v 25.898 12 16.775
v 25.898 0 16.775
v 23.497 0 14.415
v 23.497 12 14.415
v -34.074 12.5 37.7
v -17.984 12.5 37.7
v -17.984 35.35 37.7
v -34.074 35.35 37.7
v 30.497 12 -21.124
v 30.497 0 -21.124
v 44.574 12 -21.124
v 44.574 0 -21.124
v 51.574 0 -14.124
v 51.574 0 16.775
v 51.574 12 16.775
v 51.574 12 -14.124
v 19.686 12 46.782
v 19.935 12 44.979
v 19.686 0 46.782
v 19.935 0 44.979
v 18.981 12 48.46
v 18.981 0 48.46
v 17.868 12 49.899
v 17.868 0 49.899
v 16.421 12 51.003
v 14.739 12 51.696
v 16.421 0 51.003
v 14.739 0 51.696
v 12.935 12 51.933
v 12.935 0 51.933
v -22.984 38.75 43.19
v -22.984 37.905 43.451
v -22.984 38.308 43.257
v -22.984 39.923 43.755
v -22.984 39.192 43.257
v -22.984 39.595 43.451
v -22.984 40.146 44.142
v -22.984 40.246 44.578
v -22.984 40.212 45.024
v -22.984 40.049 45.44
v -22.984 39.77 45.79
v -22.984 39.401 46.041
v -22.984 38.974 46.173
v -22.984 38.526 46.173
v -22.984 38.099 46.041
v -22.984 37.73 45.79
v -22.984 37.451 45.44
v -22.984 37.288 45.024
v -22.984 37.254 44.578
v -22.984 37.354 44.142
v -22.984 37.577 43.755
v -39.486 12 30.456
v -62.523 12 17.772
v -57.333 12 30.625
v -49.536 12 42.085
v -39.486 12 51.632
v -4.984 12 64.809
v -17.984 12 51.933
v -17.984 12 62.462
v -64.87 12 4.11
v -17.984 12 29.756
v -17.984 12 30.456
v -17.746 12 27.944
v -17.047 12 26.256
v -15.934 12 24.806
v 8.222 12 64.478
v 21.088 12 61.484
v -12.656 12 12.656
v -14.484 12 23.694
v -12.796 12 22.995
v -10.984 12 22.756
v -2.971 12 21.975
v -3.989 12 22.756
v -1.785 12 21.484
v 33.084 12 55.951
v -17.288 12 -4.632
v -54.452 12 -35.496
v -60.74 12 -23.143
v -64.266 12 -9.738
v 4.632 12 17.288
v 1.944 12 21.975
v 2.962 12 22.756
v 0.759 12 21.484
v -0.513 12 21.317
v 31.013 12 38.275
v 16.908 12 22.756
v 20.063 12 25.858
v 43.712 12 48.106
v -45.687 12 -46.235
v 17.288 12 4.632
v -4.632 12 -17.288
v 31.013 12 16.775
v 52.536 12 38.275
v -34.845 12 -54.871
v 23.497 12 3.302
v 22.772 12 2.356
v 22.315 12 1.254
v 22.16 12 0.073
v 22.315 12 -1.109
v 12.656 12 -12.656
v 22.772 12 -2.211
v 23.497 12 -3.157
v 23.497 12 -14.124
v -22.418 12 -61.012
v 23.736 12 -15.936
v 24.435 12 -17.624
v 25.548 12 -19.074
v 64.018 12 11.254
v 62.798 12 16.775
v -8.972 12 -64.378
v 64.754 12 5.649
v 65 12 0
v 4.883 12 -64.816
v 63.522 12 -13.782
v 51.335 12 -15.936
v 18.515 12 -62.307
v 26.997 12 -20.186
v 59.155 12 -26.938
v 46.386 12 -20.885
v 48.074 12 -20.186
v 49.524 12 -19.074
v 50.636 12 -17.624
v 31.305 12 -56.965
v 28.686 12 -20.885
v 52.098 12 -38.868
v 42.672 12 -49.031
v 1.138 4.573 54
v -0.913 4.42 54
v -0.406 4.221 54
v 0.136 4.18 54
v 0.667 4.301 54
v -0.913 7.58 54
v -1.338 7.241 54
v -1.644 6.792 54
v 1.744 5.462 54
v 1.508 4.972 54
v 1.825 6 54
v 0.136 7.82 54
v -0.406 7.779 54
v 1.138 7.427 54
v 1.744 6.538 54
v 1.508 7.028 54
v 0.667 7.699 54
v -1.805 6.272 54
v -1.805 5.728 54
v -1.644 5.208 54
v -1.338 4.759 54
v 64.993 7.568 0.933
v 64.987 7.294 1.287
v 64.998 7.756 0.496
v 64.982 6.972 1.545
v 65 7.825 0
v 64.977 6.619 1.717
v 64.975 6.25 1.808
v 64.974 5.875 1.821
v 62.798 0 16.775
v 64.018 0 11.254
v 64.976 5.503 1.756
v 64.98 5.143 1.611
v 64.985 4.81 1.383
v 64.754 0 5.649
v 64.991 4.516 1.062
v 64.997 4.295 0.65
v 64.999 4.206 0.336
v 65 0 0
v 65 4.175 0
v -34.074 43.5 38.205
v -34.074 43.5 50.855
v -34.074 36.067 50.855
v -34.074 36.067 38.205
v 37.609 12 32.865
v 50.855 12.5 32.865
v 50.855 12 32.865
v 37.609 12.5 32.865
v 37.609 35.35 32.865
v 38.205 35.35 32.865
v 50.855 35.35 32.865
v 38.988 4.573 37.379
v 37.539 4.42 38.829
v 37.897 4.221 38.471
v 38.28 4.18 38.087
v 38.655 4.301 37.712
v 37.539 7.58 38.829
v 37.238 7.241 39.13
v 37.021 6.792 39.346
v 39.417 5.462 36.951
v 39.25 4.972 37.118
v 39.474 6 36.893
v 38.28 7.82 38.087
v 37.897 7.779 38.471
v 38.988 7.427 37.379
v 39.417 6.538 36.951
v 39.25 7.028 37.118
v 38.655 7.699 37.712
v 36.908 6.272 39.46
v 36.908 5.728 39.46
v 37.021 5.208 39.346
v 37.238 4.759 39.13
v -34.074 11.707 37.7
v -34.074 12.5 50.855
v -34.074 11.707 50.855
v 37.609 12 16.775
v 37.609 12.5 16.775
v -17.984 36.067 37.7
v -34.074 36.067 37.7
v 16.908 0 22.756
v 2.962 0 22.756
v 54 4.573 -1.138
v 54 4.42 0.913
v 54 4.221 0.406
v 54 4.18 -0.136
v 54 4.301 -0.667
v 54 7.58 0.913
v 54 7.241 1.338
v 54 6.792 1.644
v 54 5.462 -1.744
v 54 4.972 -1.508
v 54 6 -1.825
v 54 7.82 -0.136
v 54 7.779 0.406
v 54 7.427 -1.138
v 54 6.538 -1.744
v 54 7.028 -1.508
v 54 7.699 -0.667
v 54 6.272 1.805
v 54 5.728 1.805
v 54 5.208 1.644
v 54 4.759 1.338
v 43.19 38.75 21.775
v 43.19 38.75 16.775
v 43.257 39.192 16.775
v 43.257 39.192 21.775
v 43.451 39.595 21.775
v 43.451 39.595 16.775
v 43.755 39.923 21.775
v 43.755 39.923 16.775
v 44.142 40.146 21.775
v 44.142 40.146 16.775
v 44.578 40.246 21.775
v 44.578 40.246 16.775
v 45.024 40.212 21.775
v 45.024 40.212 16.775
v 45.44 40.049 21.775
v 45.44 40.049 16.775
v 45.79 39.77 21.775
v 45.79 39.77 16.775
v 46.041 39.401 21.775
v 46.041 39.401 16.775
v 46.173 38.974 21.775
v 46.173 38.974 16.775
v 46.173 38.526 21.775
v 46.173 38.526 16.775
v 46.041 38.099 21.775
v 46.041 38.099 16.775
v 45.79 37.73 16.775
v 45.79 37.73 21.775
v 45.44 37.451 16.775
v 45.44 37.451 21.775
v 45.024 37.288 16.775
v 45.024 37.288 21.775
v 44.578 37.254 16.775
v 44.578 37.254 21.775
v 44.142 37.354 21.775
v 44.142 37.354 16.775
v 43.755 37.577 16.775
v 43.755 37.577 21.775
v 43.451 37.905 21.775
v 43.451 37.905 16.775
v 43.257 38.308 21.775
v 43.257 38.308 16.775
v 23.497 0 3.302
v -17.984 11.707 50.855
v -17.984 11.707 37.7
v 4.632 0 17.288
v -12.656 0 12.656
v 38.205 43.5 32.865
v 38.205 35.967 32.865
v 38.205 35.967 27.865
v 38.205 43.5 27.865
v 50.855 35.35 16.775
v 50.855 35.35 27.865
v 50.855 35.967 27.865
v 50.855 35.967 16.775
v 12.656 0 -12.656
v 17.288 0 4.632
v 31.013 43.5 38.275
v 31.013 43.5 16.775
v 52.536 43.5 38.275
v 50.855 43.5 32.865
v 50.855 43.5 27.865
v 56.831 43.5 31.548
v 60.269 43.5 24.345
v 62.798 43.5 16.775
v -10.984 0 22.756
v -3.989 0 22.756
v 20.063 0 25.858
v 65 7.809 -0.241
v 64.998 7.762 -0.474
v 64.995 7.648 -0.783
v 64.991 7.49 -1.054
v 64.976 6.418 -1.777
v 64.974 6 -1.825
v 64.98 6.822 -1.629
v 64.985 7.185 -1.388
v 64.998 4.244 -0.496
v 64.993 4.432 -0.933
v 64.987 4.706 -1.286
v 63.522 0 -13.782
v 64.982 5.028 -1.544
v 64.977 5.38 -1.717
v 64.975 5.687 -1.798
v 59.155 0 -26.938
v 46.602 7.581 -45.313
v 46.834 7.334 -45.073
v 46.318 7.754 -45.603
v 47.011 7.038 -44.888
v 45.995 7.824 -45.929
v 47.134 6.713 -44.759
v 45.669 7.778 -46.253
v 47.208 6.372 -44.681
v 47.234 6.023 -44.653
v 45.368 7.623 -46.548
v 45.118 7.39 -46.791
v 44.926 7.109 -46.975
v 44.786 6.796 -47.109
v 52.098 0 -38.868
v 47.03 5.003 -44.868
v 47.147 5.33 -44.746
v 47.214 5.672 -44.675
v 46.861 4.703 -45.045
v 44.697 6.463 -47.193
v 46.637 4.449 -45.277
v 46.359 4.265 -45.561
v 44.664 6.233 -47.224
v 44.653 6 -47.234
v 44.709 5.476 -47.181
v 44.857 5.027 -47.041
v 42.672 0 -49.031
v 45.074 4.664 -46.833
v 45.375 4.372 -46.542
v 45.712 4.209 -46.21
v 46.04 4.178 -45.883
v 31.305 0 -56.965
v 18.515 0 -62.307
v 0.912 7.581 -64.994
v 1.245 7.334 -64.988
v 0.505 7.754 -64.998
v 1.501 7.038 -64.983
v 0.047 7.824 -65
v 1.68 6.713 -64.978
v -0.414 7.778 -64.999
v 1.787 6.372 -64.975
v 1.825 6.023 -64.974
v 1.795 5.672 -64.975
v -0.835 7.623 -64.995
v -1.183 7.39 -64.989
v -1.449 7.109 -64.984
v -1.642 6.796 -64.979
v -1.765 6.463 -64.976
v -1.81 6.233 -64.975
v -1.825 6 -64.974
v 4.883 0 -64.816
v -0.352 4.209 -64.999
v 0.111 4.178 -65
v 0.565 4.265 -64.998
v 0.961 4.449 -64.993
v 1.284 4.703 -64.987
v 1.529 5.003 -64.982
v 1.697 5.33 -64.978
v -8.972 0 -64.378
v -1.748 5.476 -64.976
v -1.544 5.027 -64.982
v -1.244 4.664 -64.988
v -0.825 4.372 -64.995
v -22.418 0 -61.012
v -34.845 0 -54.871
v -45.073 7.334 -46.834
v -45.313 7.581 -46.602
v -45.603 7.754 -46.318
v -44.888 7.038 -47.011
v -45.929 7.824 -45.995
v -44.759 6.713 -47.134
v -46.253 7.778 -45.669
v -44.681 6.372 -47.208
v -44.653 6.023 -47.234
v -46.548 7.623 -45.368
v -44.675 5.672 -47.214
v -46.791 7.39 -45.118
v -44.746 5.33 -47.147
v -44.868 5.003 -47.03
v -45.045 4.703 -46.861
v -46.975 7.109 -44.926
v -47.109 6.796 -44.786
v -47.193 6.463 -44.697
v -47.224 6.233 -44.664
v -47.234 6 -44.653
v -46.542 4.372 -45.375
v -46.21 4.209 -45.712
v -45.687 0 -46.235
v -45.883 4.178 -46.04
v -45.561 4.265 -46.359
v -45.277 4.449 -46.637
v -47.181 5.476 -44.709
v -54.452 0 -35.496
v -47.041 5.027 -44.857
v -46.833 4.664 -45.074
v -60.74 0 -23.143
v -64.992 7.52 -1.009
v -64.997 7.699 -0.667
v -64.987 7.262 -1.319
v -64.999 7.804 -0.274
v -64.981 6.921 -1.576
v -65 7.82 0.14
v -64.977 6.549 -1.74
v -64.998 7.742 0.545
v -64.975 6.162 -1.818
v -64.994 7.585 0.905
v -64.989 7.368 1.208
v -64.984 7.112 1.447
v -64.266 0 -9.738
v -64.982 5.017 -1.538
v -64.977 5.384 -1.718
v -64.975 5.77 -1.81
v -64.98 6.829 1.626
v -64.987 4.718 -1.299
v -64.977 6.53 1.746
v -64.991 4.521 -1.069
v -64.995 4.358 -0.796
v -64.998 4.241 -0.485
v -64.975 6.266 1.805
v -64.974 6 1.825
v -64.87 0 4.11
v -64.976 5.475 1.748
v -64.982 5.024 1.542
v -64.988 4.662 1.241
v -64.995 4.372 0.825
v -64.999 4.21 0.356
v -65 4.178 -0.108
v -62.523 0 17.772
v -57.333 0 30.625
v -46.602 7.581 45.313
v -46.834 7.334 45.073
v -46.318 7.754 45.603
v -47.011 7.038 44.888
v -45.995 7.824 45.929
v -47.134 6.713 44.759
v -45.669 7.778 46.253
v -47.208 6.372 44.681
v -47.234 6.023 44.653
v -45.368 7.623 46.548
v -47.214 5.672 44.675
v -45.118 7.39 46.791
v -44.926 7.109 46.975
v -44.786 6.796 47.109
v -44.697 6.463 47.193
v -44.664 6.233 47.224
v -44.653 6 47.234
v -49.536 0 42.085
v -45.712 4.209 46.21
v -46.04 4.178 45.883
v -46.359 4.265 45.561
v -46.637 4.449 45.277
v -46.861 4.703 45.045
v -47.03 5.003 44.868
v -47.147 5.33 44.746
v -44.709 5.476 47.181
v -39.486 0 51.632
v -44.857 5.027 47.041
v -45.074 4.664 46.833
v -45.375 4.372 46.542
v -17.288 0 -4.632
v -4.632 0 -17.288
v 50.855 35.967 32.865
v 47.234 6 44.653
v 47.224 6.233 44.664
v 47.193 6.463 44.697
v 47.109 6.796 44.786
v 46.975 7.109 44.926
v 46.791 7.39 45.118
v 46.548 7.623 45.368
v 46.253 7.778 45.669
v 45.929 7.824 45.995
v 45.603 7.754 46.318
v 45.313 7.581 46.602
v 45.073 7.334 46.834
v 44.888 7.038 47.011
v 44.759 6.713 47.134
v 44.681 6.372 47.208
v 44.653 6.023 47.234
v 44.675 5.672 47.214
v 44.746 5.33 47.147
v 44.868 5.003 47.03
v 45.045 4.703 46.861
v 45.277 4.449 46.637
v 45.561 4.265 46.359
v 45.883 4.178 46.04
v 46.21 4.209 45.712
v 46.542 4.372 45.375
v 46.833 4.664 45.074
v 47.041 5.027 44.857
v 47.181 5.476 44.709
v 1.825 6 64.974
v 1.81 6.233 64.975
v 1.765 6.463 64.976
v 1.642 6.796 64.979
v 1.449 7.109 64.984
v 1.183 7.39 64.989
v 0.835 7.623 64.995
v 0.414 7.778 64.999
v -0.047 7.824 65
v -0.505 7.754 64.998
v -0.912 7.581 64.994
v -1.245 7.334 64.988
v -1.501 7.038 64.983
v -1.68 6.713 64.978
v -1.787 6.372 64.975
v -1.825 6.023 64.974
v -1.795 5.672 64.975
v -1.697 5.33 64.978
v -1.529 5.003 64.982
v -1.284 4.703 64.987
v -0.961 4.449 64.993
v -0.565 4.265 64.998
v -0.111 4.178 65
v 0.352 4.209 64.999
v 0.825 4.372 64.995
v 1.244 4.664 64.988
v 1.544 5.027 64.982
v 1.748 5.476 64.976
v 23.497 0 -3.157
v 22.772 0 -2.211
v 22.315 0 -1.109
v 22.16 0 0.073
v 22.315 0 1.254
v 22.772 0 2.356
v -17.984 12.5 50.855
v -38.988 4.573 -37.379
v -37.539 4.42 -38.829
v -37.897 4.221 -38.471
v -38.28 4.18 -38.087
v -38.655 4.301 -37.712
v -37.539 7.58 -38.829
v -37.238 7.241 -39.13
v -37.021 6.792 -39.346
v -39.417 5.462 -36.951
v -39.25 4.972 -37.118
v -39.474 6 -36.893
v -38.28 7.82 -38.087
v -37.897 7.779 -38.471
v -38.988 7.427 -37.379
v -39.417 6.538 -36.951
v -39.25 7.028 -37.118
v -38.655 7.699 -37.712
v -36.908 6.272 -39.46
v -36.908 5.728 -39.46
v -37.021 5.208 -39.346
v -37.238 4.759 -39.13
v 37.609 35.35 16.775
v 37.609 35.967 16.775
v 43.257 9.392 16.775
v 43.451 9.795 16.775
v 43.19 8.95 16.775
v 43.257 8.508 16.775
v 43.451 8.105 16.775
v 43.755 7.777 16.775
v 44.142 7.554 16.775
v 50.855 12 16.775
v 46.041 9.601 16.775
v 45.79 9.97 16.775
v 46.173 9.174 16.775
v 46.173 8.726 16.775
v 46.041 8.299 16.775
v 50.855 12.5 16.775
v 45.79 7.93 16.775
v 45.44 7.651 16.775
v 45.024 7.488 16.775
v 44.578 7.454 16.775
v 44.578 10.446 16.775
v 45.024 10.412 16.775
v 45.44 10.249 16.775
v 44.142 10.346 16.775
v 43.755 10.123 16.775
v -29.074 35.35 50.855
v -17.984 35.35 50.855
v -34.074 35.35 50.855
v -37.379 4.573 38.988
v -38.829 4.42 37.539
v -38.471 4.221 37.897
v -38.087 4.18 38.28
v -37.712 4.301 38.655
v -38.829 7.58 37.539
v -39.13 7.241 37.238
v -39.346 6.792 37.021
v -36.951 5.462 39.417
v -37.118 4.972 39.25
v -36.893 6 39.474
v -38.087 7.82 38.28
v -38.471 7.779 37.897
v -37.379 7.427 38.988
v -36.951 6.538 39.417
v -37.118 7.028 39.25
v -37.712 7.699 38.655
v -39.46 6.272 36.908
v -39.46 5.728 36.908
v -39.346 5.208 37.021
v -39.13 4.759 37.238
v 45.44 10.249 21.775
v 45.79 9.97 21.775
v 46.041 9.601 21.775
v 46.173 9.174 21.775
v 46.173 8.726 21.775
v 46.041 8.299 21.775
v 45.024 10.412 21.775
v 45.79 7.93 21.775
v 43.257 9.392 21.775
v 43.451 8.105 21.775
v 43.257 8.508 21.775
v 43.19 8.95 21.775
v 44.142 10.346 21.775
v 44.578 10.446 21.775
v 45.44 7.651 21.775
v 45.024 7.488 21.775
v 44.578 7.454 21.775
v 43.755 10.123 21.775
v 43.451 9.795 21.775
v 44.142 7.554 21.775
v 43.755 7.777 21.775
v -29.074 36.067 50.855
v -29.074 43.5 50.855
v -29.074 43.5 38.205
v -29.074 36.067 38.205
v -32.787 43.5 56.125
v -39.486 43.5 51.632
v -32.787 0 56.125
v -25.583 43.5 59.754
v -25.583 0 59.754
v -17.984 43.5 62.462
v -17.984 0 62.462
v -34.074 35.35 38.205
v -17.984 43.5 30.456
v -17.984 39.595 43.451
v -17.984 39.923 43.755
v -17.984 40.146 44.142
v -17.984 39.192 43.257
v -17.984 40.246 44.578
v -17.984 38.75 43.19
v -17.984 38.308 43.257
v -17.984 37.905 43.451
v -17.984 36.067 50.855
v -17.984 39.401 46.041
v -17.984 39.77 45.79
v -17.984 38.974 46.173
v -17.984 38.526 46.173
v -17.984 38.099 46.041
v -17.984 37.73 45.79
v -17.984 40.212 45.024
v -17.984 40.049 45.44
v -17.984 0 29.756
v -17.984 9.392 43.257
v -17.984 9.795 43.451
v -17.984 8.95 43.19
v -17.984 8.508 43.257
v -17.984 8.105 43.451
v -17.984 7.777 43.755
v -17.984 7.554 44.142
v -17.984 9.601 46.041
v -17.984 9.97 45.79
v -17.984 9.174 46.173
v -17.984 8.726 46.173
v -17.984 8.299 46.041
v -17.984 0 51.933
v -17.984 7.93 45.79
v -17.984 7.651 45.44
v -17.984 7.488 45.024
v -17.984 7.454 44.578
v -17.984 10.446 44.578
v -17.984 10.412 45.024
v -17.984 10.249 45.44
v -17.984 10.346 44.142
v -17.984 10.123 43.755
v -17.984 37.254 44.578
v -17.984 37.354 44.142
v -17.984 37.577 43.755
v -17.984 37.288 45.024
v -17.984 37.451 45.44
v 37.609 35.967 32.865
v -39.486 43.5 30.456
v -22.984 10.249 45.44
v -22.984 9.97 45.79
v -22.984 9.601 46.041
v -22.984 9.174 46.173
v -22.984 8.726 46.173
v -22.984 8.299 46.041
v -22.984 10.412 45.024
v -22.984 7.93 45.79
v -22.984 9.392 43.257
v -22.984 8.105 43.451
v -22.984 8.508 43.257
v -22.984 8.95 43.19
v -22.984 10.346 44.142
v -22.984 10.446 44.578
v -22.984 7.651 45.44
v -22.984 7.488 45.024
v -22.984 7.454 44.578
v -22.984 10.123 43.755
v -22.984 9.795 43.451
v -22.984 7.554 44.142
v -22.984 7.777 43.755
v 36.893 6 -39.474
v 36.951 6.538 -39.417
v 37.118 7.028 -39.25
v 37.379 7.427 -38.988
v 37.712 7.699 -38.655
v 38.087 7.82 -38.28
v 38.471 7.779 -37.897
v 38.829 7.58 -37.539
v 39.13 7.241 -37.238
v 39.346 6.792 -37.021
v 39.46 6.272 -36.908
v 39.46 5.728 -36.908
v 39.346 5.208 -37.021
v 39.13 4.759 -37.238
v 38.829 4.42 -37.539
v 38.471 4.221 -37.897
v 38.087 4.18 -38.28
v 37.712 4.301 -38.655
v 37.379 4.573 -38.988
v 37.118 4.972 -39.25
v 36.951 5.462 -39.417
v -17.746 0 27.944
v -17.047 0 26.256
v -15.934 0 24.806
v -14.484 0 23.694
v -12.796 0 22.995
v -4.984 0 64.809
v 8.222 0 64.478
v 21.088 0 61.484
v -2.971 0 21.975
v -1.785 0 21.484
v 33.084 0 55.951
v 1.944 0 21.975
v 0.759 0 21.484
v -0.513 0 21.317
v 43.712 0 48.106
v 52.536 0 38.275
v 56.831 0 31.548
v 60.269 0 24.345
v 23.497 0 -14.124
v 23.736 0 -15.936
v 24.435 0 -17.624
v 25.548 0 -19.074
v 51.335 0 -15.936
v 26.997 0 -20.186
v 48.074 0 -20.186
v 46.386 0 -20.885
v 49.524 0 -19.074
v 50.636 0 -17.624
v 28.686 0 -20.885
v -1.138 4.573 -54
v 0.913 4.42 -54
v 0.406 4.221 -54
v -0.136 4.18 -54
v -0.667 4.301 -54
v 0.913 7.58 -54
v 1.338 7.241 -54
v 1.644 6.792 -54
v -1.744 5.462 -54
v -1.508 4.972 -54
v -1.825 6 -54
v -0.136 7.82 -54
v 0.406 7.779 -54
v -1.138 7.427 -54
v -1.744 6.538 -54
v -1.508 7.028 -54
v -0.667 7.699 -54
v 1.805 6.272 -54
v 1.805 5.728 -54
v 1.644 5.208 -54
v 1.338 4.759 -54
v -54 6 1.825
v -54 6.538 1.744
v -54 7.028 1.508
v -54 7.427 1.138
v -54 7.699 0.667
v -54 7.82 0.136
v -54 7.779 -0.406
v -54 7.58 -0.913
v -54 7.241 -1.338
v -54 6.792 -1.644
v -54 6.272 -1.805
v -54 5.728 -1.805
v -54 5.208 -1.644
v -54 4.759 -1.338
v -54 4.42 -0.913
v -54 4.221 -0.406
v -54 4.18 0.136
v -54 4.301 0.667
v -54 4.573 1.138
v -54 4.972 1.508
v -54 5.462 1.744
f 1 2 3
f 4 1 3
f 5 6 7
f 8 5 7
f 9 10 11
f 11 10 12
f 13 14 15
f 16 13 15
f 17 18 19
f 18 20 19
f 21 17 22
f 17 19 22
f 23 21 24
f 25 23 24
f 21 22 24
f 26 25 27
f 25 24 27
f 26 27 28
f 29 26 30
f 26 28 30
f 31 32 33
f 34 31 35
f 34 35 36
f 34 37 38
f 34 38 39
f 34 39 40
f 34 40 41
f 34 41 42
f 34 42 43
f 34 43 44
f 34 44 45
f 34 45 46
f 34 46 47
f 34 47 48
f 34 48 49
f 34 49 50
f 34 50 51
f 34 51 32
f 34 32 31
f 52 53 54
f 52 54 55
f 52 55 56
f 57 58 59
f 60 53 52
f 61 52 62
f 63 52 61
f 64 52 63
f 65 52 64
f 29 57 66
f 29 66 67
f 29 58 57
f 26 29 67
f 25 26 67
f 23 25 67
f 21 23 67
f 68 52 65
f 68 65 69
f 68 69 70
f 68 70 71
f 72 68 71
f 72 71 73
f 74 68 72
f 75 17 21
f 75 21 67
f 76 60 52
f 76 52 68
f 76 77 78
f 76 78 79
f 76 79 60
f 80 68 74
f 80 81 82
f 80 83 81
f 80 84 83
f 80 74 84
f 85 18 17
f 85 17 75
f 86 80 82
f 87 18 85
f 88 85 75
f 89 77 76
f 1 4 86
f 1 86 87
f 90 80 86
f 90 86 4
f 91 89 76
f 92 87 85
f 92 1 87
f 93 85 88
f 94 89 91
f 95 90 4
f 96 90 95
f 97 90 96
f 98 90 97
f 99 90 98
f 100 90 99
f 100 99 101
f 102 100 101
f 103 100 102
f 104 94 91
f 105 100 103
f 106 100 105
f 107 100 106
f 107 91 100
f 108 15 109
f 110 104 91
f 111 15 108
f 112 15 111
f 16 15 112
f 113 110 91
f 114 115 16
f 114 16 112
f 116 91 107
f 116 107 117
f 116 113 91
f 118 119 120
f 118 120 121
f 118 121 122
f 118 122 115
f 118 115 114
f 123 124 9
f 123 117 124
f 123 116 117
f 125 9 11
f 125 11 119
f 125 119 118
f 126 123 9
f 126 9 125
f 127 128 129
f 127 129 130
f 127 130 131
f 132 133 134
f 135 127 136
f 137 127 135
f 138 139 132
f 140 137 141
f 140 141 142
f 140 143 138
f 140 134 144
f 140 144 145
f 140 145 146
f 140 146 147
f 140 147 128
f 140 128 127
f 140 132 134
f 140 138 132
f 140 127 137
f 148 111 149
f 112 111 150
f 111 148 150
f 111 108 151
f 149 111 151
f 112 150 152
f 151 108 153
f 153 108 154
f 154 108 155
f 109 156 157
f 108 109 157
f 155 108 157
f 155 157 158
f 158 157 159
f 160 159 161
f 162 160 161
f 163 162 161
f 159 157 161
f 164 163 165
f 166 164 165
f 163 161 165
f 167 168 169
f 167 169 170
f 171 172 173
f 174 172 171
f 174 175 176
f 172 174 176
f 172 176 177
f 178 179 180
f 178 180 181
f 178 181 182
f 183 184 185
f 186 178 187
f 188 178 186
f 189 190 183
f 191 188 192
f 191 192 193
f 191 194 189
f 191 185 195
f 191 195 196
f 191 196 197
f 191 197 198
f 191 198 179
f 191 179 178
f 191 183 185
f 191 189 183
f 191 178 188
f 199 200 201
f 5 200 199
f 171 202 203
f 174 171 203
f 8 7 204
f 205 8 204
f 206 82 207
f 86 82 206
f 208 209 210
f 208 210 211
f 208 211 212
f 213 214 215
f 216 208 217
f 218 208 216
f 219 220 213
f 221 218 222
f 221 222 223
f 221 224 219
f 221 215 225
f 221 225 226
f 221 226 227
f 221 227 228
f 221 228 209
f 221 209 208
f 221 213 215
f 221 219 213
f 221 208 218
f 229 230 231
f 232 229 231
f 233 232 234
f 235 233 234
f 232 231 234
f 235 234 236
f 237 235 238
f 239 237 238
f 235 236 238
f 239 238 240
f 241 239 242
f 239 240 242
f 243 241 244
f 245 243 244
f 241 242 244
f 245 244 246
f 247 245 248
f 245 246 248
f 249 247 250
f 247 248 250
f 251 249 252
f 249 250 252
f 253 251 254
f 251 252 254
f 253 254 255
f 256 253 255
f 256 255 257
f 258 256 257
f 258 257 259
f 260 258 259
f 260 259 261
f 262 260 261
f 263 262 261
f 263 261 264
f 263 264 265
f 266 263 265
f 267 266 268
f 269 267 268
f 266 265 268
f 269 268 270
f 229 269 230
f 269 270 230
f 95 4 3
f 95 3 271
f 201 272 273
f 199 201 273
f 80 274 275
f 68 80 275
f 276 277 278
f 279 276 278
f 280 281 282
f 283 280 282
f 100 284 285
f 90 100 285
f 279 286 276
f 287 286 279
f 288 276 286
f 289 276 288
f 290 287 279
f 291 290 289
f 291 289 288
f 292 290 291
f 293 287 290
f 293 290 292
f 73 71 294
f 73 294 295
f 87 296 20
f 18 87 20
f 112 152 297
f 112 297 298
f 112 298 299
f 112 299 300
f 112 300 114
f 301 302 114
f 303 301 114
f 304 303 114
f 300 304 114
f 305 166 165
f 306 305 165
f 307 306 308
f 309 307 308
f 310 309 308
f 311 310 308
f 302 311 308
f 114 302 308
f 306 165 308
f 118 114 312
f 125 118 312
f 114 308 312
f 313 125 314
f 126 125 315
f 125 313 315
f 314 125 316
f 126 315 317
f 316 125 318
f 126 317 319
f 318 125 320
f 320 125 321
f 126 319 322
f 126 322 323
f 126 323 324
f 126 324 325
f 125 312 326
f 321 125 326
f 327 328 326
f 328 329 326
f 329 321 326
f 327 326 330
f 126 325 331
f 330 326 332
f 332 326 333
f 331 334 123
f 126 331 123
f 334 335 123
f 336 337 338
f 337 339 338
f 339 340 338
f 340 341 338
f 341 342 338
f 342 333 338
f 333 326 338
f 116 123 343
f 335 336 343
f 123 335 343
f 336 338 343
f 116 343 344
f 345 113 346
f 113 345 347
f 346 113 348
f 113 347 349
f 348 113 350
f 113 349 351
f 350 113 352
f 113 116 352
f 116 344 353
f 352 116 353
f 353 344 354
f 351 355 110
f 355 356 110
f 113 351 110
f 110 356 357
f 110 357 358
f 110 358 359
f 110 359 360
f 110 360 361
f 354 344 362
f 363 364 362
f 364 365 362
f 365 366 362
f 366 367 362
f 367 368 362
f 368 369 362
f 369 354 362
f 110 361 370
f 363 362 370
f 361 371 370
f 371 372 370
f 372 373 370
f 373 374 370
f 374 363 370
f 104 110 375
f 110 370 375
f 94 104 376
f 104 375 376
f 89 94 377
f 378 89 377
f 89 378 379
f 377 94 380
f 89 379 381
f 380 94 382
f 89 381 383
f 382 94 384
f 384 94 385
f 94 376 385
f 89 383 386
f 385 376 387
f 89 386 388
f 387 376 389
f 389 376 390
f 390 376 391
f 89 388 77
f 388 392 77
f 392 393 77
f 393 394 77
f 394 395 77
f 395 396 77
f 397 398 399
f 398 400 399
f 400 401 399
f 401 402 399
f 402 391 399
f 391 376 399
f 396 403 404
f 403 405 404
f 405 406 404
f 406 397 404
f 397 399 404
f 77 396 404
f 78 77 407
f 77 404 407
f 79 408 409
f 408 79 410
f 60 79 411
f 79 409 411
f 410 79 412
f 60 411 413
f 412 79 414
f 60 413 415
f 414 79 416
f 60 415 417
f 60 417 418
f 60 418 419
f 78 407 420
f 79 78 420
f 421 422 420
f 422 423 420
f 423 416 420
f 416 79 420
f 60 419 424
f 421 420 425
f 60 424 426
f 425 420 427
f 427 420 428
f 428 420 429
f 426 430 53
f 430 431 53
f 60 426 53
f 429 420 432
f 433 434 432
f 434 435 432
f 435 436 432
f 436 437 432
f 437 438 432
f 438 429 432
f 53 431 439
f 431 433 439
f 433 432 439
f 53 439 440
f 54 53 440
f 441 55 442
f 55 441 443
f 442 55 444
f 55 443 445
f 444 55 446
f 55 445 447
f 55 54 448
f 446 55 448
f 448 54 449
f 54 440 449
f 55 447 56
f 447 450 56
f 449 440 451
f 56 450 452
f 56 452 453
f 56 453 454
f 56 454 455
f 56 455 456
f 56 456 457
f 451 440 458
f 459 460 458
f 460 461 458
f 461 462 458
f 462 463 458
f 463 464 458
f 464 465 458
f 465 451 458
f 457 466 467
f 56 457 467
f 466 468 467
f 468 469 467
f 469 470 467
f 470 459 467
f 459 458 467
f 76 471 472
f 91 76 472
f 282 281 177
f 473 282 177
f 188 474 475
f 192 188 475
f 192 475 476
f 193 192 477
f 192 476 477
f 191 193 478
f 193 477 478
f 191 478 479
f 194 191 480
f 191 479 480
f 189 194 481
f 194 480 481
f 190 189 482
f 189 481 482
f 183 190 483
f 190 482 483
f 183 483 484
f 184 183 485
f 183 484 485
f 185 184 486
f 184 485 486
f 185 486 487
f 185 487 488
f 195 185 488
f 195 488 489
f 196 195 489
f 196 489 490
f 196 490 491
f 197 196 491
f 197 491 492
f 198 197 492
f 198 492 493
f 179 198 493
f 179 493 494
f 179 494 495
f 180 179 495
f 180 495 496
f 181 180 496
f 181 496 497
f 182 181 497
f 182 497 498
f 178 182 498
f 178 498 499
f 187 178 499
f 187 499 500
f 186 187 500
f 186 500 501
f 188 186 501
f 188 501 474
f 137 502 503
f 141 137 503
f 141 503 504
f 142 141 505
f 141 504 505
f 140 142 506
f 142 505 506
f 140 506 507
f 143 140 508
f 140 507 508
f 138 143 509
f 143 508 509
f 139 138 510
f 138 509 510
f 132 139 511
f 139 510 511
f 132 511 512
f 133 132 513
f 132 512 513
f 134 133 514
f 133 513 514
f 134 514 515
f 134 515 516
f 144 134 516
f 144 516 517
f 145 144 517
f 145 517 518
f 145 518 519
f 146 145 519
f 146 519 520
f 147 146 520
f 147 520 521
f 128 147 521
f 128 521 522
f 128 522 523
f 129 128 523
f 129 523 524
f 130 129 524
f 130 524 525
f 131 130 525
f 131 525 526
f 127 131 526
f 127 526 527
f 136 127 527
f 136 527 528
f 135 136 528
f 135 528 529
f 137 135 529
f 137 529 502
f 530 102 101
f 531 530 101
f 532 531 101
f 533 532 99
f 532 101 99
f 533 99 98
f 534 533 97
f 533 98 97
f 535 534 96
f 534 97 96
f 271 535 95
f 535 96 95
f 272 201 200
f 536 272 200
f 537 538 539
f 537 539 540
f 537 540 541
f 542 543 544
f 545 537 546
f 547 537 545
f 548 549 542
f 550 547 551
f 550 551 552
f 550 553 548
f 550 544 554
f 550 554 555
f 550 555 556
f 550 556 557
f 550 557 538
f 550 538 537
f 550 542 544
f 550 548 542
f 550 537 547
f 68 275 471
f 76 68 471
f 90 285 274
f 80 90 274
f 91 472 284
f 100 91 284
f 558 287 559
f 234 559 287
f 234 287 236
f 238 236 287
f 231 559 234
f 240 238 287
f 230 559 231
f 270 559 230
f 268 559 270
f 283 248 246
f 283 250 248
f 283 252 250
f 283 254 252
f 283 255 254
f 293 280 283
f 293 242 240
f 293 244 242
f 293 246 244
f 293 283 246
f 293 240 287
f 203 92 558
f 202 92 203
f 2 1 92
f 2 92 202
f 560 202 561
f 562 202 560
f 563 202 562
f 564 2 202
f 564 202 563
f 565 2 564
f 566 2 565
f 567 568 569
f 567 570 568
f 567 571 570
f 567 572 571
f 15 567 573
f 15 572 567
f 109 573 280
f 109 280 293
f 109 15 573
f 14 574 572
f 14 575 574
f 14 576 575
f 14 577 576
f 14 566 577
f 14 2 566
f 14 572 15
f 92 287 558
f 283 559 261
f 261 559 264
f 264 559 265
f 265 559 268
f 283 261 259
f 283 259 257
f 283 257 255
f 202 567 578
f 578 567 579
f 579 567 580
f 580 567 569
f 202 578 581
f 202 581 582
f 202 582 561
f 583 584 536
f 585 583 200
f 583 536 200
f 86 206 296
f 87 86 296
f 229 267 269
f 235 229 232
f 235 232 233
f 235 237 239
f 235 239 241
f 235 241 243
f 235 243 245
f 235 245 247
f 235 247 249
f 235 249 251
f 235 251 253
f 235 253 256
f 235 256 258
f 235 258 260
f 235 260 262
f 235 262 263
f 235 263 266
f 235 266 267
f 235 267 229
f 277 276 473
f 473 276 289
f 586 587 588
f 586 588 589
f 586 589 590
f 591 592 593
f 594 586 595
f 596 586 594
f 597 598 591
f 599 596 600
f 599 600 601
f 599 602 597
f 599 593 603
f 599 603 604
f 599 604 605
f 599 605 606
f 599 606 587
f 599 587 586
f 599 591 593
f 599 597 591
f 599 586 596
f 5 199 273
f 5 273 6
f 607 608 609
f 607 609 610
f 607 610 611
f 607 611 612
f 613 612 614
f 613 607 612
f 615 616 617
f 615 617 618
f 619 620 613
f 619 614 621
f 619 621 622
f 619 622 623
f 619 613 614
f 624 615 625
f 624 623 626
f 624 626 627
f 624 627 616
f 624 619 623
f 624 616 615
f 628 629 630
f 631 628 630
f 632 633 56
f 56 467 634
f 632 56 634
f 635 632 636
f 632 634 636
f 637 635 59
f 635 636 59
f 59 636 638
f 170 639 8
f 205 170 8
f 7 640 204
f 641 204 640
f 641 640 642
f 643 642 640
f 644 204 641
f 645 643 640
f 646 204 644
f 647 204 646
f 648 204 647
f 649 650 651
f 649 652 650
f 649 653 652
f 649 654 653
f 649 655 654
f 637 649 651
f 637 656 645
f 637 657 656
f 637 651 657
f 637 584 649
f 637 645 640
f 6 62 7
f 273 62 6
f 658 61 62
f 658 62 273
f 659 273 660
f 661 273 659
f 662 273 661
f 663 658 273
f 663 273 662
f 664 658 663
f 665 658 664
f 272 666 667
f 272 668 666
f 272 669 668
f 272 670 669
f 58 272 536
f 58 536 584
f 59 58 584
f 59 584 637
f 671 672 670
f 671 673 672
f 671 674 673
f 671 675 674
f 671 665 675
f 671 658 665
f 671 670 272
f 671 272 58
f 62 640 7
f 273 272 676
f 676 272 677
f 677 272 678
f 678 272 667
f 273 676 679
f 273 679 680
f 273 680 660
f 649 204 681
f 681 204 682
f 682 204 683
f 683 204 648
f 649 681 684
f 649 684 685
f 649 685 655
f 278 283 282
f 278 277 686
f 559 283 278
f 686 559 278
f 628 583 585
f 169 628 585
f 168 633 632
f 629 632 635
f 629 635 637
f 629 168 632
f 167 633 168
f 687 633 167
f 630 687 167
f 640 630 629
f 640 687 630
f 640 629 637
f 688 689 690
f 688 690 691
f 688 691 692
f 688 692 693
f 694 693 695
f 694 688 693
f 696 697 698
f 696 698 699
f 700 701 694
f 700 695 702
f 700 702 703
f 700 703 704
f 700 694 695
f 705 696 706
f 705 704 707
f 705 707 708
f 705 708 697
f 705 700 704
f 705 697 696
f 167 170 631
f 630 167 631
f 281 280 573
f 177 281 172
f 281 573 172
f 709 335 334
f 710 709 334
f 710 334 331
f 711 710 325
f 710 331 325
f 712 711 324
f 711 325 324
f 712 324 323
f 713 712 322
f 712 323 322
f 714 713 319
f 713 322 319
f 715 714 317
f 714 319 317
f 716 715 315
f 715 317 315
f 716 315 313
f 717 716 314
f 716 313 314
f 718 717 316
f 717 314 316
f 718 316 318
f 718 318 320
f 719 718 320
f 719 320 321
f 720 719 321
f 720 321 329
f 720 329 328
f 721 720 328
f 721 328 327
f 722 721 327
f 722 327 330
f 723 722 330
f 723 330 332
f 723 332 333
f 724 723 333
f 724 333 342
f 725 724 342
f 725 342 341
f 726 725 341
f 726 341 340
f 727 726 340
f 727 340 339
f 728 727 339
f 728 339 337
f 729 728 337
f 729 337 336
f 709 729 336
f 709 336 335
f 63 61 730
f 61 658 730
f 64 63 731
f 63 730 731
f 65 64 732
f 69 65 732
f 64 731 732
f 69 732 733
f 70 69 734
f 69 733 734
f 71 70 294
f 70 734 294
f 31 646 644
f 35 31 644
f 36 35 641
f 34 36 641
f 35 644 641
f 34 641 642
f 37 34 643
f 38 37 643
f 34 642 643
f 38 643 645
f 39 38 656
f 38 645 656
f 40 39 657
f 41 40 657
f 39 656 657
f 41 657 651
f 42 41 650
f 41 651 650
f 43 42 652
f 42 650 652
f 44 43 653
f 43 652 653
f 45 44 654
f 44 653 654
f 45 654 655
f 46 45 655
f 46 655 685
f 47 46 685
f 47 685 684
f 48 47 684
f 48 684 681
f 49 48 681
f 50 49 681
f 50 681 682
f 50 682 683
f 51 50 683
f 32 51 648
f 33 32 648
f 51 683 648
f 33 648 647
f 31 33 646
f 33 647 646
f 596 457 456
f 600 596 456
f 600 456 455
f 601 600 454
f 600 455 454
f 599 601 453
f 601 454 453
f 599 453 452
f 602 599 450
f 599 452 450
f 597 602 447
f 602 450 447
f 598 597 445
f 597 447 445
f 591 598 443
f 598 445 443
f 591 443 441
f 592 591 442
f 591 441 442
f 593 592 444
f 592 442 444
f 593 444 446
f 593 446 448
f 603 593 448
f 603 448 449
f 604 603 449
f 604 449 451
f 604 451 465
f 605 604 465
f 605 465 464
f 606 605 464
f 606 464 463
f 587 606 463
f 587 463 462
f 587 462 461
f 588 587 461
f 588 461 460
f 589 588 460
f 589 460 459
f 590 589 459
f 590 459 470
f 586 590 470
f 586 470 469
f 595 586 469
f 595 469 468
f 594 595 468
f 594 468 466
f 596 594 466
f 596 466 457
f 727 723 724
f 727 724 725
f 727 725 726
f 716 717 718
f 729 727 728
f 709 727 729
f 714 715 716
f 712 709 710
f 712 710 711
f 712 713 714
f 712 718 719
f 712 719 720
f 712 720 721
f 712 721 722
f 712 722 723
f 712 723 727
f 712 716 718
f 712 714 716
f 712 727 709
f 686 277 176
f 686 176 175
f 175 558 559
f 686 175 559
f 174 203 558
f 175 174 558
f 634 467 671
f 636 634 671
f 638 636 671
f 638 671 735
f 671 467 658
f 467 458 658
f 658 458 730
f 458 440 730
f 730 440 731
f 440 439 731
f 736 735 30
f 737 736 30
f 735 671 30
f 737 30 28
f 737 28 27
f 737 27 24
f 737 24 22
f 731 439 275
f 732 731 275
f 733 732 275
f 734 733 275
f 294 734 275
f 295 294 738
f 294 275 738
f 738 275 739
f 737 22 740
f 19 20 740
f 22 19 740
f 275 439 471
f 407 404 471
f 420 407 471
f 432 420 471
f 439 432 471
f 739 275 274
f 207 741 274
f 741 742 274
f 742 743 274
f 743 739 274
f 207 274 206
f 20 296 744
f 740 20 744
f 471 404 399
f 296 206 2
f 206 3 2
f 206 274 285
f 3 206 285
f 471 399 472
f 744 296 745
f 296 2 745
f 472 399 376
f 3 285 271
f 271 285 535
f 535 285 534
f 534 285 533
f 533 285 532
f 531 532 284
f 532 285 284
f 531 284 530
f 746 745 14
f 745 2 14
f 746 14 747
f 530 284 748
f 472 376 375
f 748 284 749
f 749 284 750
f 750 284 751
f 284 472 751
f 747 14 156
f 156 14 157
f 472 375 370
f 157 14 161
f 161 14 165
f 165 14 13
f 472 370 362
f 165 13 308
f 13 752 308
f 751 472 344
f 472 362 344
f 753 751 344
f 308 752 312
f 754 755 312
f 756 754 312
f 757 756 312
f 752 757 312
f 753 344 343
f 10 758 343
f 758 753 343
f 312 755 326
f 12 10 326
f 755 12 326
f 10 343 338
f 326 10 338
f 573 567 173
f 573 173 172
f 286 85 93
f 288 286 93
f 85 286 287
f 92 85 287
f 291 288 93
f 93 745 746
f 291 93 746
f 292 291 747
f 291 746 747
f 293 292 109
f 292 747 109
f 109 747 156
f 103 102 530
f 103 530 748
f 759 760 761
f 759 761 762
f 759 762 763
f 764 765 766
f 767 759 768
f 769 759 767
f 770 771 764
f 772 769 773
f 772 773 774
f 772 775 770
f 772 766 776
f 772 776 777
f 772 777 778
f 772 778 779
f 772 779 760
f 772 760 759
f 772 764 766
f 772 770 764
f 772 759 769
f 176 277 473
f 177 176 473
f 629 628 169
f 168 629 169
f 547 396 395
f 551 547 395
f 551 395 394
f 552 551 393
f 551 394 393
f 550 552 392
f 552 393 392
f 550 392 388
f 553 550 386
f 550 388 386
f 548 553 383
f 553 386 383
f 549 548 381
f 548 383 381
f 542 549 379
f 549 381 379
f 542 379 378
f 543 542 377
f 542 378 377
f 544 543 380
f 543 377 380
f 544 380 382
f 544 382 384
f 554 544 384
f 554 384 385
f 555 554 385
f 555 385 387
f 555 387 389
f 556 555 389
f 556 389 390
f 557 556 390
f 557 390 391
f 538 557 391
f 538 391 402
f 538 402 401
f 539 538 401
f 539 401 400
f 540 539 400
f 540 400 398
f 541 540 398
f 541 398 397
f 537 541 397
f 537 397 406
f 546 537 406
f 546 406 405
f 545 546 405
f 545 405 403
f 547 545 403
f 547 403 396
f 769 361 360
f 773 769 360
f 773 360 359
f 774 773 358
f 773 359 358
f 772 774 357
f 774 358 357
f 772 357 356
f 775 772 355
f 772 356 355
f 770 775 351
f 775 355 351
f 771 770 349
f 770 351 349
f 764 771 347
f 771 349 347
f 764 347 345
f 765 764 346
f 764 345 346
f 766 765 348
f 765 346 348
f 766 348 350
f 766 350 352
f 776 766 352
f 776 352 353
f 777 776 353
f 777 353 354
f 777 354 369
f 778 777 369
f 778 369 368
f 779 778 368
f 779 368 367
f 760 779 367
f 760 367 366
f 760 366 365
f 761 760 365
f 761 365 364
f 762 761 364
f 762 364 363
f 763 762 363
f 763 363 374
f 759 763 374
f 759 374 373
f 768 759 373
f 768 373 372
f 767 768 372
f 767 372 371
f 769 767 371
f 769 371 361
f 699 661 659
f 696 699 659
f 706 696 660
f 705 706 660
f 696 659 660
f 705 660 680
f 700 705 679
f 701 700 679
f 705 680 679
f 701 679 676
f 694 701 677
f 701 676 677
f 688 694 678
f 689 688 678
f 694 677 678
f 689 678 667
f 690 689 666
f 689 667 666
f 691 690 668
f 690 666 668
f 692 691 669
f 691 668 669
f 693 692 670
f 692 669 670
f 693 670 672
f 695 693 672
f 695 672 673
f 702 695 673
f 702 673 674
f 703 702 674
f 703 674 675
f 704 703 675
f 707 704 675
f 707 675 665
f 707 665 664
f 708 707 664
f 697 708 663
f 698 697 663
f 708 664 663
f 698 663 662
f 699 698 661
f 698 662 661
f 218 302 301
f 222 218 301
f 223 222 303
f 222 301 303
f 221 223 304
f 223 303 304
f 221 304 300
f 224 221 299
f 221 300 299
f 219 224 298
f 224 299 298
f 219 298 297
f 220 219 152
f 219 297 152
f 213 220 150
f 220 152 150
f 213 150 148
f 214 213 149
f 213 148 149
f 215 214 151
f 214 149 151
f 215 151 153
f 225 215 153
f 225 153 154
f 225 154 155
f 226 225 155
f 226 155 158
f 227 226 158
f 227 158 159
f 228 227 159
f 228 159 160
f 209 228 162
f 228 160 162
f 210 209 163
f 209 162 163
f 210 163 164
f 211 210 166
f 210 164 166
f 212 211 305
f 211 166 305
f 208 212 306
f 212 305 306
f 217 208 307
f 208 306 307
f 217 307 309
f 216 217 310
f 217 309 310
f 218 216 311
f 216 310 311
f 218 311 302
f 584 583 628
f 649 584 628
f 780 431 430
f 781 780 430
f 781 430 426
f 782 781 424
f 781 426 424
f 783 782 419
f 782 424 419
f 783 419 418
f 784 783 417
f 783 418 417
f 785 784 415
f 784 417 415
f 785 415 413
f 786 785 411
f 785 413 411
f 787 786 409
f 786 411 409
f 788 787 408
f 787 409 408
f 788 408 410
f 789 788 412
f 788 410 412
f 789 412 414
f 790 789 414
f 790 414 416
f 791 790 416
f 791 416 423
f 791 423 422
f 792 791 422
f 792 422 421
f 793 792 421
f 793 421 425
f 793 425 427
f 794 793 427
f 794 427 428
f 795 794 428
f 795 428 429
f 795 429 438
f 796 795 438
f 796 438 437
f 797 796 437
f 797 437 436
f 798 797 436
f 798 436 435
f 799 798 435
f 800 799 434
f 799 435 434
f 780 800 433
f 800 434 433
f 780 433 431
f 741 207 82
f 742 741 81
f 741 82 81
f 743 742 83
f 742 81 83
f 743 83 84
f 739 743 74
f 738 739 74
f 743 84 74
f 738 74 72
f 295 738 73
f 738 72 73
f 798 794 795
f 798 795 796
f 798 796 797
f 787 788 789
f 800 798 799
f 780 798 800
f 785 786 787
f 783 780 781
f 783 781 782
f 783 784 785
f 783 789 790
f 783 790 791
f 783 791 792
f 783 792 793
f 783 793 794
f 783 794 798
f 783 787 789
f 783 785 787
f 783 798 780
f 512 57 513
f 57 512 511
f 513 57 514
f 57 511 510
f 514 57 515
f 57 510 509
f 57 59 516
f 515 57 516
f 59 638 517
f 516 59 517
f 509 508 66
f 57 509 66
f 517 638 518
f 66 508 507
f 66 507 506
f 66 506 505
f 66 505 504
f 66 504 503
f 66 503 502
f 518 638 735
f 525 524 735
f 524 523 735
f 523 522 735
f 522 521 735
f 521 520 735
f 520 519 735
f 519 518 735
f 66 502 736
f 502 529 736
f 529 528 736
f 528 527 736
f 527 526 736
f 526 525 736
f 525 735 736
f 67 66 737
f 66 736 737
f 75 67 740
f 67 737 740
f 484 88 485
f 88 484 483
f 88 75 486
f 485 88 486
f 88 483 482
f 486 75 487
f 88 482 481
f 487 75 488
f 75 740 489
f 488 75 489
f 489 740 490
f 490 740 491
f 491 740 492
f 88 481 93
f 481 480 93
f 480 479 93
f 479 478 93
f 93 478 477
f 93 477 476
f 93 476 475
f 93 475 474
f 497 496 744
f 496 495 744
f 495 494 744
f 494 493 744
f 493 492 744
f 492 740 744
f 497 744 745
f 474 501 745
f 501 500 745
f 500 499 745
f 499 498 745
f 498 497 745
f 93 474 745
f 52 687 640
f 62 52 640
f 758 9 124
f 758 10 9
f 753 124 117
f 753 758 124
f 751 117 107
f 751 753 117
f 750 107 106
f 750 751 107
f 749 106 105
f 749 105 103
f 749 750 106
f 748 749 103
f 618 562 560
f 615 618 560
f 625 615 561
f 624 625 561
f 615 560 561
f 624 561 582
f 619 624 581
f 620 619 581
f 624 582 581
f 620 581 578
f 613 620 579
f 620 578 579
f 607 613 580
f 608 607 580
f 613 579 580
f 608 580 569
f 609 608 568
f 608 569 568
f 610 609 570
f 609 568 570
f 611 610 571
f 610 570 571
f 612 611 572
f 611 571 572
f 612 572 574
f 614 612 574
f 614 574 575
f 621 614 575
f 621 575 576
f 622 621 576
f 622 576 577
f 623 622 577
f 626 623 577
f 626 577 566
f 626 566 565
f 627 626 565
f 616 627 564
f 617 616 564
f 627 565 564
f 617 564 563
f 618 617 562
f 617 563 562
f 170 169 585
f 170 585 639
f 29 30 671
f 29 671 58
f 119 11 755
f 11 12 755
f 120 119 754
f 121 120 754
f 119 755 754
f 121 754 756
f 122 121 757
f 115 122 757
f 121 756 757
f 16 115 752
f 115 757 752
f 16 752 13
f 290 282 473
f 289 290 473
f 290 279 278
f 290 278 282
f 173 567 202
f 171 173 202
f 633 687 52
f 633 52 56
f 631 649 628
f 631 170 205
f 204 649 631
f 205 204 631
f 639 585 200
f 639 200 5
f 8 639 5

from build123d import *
from build123d.topology import SkipClean

# Parameters (mm, degrees)
BOSS_EXTRUDE1_DEPTH   = 12
BOSS_EXTRUDE1_2_DEPTH = 12
BOSS_EXTRUDE2_DEPTH   = 43.5
SKETCH9_W             = 16.09
SKETCH9_H             = 12.33
BOSS_EXTRUDE3_DEPTH   = 12.5
SKETCH10_W            = 12.33
SKETCH10_H            = 16.09
BOSS_EXTRUDE4_DEPTH   = 12.5
BOSS_EXTRUDE5_START   = 22.85
SKETCH11_W            = 12.33
SKETCH11_H            = 16.09
SKETCH11_W_2          = 16.09
SKETCH11_H_2          = 12.33
BOSS_EXTRUDE5_DEPTH   = 8.15
SKETCH21_W            = 34.892896775
SKETCH21_H            = 3.983406167
SKETCH21_W_2          = 3.397806166
SKETCH21_H_2          = 35.53848689
BOSS_EXTRUDE8_DEPTH   = 12
SKETCH13_W            = 0.82460559
SKETCH13_H            = 22.85
CUT_EXTRUDE1_DEPTH    = 16.09
SKETCH14_W            = 0.915845165
SKETCH14_H            = 22.85
CUT_EXTRUDE2_DEPTH    = 16.09
SKETCH15_W            = 2.3
SKETCH15_H            = 12
BOSS_EXTRUDE6_DEPTH   = 39.09
SKETCH16_W            = 3.5
SKETCH16_H            = 12
BOSS_EXTRUDE7_DEPTH   = 39.09
SKETCH17_W            = 10.950625106
SKETCH17_H            = 21.5
SKETCH17_W_2          = 21.501773634
SKETCH17_H_2          = 11.67953826
CUT_EXTRUDE3_DEPTH    = 31.5
CUT_EXTRUDE4_START    = 65
SKETCH18_R            = 1.825
CUT_EXTRUDE4_DEPTH    = 11
CIRPATTERN1_COUNT     = 8
SKETCH19_R            = 1.5
CUT_EXTRUDE5_DEPTH    = 5
SKETCH20_R            = 1.5
CUT_EXTRUDE8_DEPTH    = 5
SKETCH22_W            = 5
SKETCH22_H            = 12.65
SKETCH22_W_2          = 12.65
SKETCH22_H_2          = 5
CUT_EXTRUDE9_DEPTH    = 12
FILLET1_R             = 7
CUT_EXTRUDE10_DEPTH   = 12
CUT_EXTRUDE11_DEPTH   = 12
SKETCH25_W            = 13.245845165
SKETCH25_H            = 0.617327952
SKETCH25_H_2          = 0.5
CUT_EXTRUDE12_DEPTH   = 16.09
SKETCH26_W            = 13.15460559
SKETCH26_H            = 0.716542238
SKETCH26_H_2          = 0.793164057
CUT_EXTRUDE13_DEPTH   = 16.09


with BuildPart() as part:
    # Sketch8 → Boss-Extrude1 (new body)
    with BuildSketch(Plane(origin=(0, 0, 0), x_dir=(1, 0, 0), z_dir=(0, 1, 0))):
        with BuildLine():
            Line((-39.48619564, -18.776596206), (-17.984422006, -18.776596206))
            Line((-17.984422006, -18.776596206), (-17.984422006, -18.772777241))
            Line((-17.984422006, -18.772777241), (12.857426144, -18.772777241))
            Line((12.857426144, -18.772777241), (20.062824101, -25.857862934))
            Line((20.062824101, -25.857862934), (20.062824101, -16.775))
            Line((20.062824101, -16.775), (25.897828719, -16.775))
            Line((25.897828719, -16.775), (20.099516291, -11.073504999))
            Line((20.099516291, -11.073504999), (20.099516291, 21.123910655))
            Line((20.099516291, 21.123910655), (53.873878262, 21.123910655))
            Line((53.873878262, 21.123910655), (53.873878262, -16.775))
            Line((53.873878262, -16.775), (62.798084167, -16.775))
            ThreePointArc((62.798084167, -16.775), (-20.966872805, 61.525525148), (-39.48619564, -51.63177659))
            Line((-39.48619564, -51.63177659), (-39.48619564, -18.776596206))
        make_face()
        Polygon((12.655697004, 12.655697004), (17.288003611, -4.632306606), (4.632306606, -17.288003611), (-12.655697004, -12.655697004), (-17.288003611, 4.632306606), (-4.632306606, 17.288003611), align=None, mode=Mode.SUBTRACT)
    extrude(amount=BOSS_EXTRUDE1_DEPTH)



with BuildPart() as body_2:
    # Sketch8 → Boss-Extrude1 2 (new body)
    with BuildSketch(Plane(origin=(0, 0, 0), x_dir=(1, 0, 0), z_dir=(0, 1, 0))):
        with BuildLine():
            Line((-17.984422006, -55.432543879), (-17.984422006, -62.462473255))
            ThreePointArc((-17.984422006, -62.462473255), (21.088153384, -61.484061242), (52.535934131, -38.275))
            Line((52.535934131, -38.275), (20.062824101, -38.275))
            Line((20.062824101, -38.275), (20.062824101, -25.857862934))
            Line((20.062824101, -25.857862934), (19.864525542, -55.432543879))
            Line((19.864525542, -55.432543879), (-17.984422006, -55.432543879))
        make_face()
    extrude(amount=BOSS_EXTRUDE1_2_DEPTH)


with BuildPart() as part_1:
    add(part.part)

    add(body_2.part)  # Boss-Extrude2 merges body 2
    # Sketch8<4> → Boss-Extrude2 (add)
    with BuildSketch(Plane(origin=(0, 0, 0), x_dir=(1, 0, 0), z_dir=(0, 1, 0))):
        with BuildLine():
            Line((-34.074422006, -38.525), (-17.984422006, -38.525))
            Line((-17.984422006, -38.525), (-17.984422006, -18.776596206))
            Line((-17.984422006, -18.776596206), (-39.48619564, -18.776596206))
            Line((-39.48619564, -18.776596206), (-39.48619564, -51.63177659))
            ThreePointArc((-39.48619564, -51.63177659), (-29.241134908, -58.051322373), (-17.984422006, -62.462473255))
            Line((-17.984422006, -62.462473255), (-17.984422006, -50.855))
            Line((-17.984422006, -50.855), (-34.074422006, -50.855))
            Line((-34.074422006, -50.855), (-34.074422006, -38.525))
        make_face()
        with BuildLine():
            Line((20.062824101, -16.775), (20.062824101, -38.275))
            Line((20.062824101, -38.275), (52.535934131, -38.275))
            ThreePointArc((52.535934131, -38.275), (58.660433379, -27.999170628), (62.798084167, -16.775))
            Line((62.798084167, -16.775), (50.855, -16.775))
            Line((50.855, -16.775), (50.855, -32.865))
            Line((50.855, -32.865), (38.525, -32.865))
            Line((38.525, -32.865), (38.525, -16.775))
            Line((38.525, -16.775), (20.062824101, -16.775))
        make_face()
    extrude(amount=BOSS_EXTRUDE2_DEPTH)

    # Sketch9 → Boss-Extrude3 (add)
    with BuildSketch(Plane.XZ):
        with Locations((-26.029422006, 44.69)):
            Rectangle(SKETCH9_W, SKETCH9_H)
    extrude(amount=-BOSS_EXTRUDE3_DEPTH)

    # Sketch10 → Boss-Extrude4 (add)
    with BuildSketch(Plane.XZ):
        with Locations((44.69, 24.82)):
            Rectangle(SKETCH10_W, SKETCH10_H)
    extrude(amount=-BOSS_EXTRUDE4_DEPTH)

    # Sketch11 → Boss-Extrude5 (add)
    with BuildSketch(Plane(origin=(0, 12.5, 0), x_dir=(1, 0, 0), z_dir=(0, 1, 0)).offset(BOSS_EXTRUDE5_START)):
        with Locations((44.69, -24.82)):
            Rectangle(SKETCH11_W, SKETCH11_H)
        with Locations((-26.029422006, -44.69)):
            Rectangle(SKETCH11_W_2, SKETCH11_H_2)
    extrude(amount=BOSS_EXTRUDE5_DEPTH)

    # Sketch21 → Boss-Extrude8 (add)
    with BuildSketch(Plane(origin=(0, 12, 0), x_dir=(1, 0, 0), z_dir=(0, 1, 0))):
        with Locations((-0.537973619, -20.764480324)):
            Rectangle(SKETCH21_W, SKETCH21_H)
        with Locations((21.798419374, 3.35466721)):
            Rectangle(SKETCH21_W_2, SKETCH21_H_2)
    extrude(amount=-BOSS_EXTRUDE8_DEPTH)

    # Sketch13 → Cut-Extrude1 (cut)
    with BuildSketch(Plane(origin=(-17.984422006, 0, 0), x_dir=(0, 0, -1), z_dir=(1, 0, 0))):
        with Locations((-38.112697205, 23.925)):
            Rectangle(SKETCH13_W, SKETCH13_H)
    extrude(amount=-CUT_EXTRUDE1_DEPTH, mode=Mode.SUBTRACT)

    # Sketch14 → Cut-Extrude2 (cut)
    with BuildSketch(Plane(origin=(0, 0, 16.775), x_dir=(-1, 0, 0), z_dir=(0, 0, -1))):
        with Locations((-38.067077418, 23.925)):
            Rectangle(SKETCH14_W, SKETCH14_H)
    extrude(amount=-CUT_EXTRUDE2_DEPTH, mode=Mode.SUBTRACT)

    # Sketch15 → Boss-Extrude6 (add)
    with BuildSketch(Plane(origin=(0, 0, 16.775), x_dir=(-1, 0, 0), z_dir=(0, 0, -1))):
        with Locations((-52.723878262, 6)):
            Rectangle(SKETCH15_W, SKETCH15_H)
    extrude(amount=BOSS_EXTRUDE6_DEPTH)

    # Sketch16 → Boss-Extrude7 (add)
    with BuildSketch(Plane(origin=(-17.984422006, 0, 0), x_dir=(0, 0, -1), z_dir=(1, 0, 0))):
        with Locations((-53.682543879, 6)):
            Rectangle(SKETCH16_W, SKETCH16_H)
    extrude(amount=BOSS_EXTRUDE7_DEPTH)

    # Sketch17 → Cut-Extrude3 (cut)
    with BuildSketch(Plane(origin=(0, 43.5, 0), x_dir=(1, 0, 0), z_dir=(0, 1, 0))):
        with Locations((25.538136654, -27.525)):
            Rectangle(SKETCH17_W, SKETCH17_H)
        with Locations((-28.735308823, -24.616365336)):
            Rectangle(SKETCH17_W_2, SKETCH17_H_2)
    extrude(amount=-CUT_EXTRUDE3_DEPTH, mode=Mode.SUBTRACT)

    # Sketch18 → Cut-Extrude4 (cut)
    with SkipClean():  # the faces are left unmerged after this step: merging them gives an invalid solid
        with BuildSketch(Plane.XY.offset(CUT_EXTRUDE4_START)):
            with Locations((0, 6)):
                Circle(SKETCH18_R)
        cut_extrude4 = extrude(amount=-CUT_EXTRUDE4_DEPTH, mode=Mode.SUBTRACT)

    # CirPattern1: Cut-Extrude4 ×8 about axis
    with SkipClean():  # the faces are left unmerged after this step: merging them gives an invalid solid
        cirpattern1_axis = Axis((0, 12, 0), (0, -1, 0))
        for i in range(1, CIRPATTERN1_COUNT):
            add(cut_extrude4.rotate(cirpattern1_axis, i * 360 / CIRPATTERN1_COUNT), mode=Mode.SUBTRACT)

    # Sketch19 → Cut-Extrude5 (cut)
    with SkipClean():  # the faces are left unmerged after this step: merging them gives an invalid solid
        with BuildSketch(Plane(origin=(0, 0, 16.775), x_dir=(-1, 0, 0), z_dir=(0, 0, -1))):
            with Locations((-44.69, 38.75)):
                Circle(SKETCH19_R)
            with Locations((-44.69, 8.95)):
                Circle(SKETCH19_R)
        extrude(amount=-CUT_EXTRUDE5_DEPTH, mode=Mode.SUBTRACT)

    # Sketch20 → Cut-Extrude8 (cut)
    with SkipClean():  # the faces are left unmerged after this step: merging them gives an invalid solid
        with BuildSketch(Plane(origin=(-17.984422006, 0, 0), x_dir=(0, 0, -1), z_dir=(1, 0, 0))):
            with Locations((-44.69, 38.75)):
                Circle(SKETCH20_R)
            with Locations((-44.69, 8.95)):
                Circle(SKETCH20_R)
        extrude(amount=-CUT_EXTRUDE8_DEPTH, mode=Mode.SUBTRACT)

    # Sketch22 → Cut-Extrude9 (cut)
    with SkipClean():  # the faces are left unmerged after this step: merging them gives an invalid solid
        with BuildSketch(Plane(origin=(0, 43.5, 0), x_dir=(1, 0, 0), z_dir=(0, 1, 0))):
            with Locations((-31.574422006, -44.53)):
                Rectangle(SKETCH22_W, SKETCH22_H)
            with Locations((44.53, -30.365)):
                Rectangle(SKETCH22_W_2, SKETCH22_H_2)
        extrude(amount=-CUT_EXTRUDE9_DEPTH, mode=Mode.SUBTRACT)

    # Fillet1
    fillet1_edges = [part_1.edges().sort_by_distance(p)[0] for p in [
        (51.573878262, 6, -21.123910655),
        (19.88799308, 6, 51.932543879),
        (-17.984422006, 6, 22.756183408),
        (23.497322457, 6, -21.123910655),
    ]]
    fillet(fillet1_edges, radius=FILLET1_R)

    # Sketch23 → Cut-Extrude10 (cut)
    with SkipClean():  # the faces are left unmerged after this step: merging them gives an invalid solid
        with BuildSketch(Plane(origin=(0, 12, 0), x_dir=(1, 0, 0), z_dir=(0, 1, 0))):
            with BuildLine():
                Line((-3.988594308, -22.756183408), (2.962026381, -22.756183408))
                ThreePointArc((2.962026381, -22.756183408), (-0.513283963, -21.31666273), (-3.988594308, -22.756183408))
            make_face()
        extrude(amount=-CUT_EXTRUDE10_DEPTH, mode=Mode.SUBTRACT)

    # Sketch24 → Cut-Extrude11 (cut)
    with SkipClean():  # the faces are left unmerged after this step: merging them gives an invalid solid
        with BuildSketch(Plane(origin=(0, 12, 0), x_dir=(1, 0, 0), z_dir=(0, 1, 0))):
            with BuildLine():
                Line((23.497322457, -3.301623153), (23.497322457, 3.156615754))
                ThreePointArc((23.497322457, 3.156615754), (22.159777385, -0.072503699), (23.497322457, -3.301623153))
            make_face()
        extrude(amount=-CUT_EXTRUDE11_DEPTH, mode=Mode.SUBTRACT)

    # Sketch25 → Cut-Extrude12 (cut)
    with SkipClean():  # the faces are left unmerged after this step: merging them gives an invalid solid
        with BuildSketch(Plane(origin=(0, 0, 16.775), x_dir=(-1, 0, 0), z_dir=(0, 0, -1))):
            with Locations((-44.232077418, 35.658663976)):
                Rectangle(SKETCH25_W, SKETCH25_H)
            with Locations((-44.232077418, 12.25)):
                Rectangle(SKETCH25_W, SKETCH25_H_2)
        extrude(amount=-CUT_EXTRUDE12_DEPTH, mode=Mode.SUBTRACT)

    # Sketch26 → Cut-Extrude13 (cut)
    with SkipClean():  # the faces are left unmerged after this step: merging them gives an invalid solid
        with BuildSketch(Plane(origin=(-17.984422006, 0, 0), x_dir=(0, 0, -1), z_dir=(1, 0, 0))):
            with Locations((-44.277697205, 35.708271119)):
                Rectangle(SKETCH26_W, SKETCH26_H)
            with Locations((-44.277697205, 12.103417972)):
                Rectangle(SKETCH26_W, SKETCH26_H_2)
        extrude(amount=-CUT_EXTRUDE13_DEPTH, mode=Mode.SUBTRACT)


solid = part_1.part
